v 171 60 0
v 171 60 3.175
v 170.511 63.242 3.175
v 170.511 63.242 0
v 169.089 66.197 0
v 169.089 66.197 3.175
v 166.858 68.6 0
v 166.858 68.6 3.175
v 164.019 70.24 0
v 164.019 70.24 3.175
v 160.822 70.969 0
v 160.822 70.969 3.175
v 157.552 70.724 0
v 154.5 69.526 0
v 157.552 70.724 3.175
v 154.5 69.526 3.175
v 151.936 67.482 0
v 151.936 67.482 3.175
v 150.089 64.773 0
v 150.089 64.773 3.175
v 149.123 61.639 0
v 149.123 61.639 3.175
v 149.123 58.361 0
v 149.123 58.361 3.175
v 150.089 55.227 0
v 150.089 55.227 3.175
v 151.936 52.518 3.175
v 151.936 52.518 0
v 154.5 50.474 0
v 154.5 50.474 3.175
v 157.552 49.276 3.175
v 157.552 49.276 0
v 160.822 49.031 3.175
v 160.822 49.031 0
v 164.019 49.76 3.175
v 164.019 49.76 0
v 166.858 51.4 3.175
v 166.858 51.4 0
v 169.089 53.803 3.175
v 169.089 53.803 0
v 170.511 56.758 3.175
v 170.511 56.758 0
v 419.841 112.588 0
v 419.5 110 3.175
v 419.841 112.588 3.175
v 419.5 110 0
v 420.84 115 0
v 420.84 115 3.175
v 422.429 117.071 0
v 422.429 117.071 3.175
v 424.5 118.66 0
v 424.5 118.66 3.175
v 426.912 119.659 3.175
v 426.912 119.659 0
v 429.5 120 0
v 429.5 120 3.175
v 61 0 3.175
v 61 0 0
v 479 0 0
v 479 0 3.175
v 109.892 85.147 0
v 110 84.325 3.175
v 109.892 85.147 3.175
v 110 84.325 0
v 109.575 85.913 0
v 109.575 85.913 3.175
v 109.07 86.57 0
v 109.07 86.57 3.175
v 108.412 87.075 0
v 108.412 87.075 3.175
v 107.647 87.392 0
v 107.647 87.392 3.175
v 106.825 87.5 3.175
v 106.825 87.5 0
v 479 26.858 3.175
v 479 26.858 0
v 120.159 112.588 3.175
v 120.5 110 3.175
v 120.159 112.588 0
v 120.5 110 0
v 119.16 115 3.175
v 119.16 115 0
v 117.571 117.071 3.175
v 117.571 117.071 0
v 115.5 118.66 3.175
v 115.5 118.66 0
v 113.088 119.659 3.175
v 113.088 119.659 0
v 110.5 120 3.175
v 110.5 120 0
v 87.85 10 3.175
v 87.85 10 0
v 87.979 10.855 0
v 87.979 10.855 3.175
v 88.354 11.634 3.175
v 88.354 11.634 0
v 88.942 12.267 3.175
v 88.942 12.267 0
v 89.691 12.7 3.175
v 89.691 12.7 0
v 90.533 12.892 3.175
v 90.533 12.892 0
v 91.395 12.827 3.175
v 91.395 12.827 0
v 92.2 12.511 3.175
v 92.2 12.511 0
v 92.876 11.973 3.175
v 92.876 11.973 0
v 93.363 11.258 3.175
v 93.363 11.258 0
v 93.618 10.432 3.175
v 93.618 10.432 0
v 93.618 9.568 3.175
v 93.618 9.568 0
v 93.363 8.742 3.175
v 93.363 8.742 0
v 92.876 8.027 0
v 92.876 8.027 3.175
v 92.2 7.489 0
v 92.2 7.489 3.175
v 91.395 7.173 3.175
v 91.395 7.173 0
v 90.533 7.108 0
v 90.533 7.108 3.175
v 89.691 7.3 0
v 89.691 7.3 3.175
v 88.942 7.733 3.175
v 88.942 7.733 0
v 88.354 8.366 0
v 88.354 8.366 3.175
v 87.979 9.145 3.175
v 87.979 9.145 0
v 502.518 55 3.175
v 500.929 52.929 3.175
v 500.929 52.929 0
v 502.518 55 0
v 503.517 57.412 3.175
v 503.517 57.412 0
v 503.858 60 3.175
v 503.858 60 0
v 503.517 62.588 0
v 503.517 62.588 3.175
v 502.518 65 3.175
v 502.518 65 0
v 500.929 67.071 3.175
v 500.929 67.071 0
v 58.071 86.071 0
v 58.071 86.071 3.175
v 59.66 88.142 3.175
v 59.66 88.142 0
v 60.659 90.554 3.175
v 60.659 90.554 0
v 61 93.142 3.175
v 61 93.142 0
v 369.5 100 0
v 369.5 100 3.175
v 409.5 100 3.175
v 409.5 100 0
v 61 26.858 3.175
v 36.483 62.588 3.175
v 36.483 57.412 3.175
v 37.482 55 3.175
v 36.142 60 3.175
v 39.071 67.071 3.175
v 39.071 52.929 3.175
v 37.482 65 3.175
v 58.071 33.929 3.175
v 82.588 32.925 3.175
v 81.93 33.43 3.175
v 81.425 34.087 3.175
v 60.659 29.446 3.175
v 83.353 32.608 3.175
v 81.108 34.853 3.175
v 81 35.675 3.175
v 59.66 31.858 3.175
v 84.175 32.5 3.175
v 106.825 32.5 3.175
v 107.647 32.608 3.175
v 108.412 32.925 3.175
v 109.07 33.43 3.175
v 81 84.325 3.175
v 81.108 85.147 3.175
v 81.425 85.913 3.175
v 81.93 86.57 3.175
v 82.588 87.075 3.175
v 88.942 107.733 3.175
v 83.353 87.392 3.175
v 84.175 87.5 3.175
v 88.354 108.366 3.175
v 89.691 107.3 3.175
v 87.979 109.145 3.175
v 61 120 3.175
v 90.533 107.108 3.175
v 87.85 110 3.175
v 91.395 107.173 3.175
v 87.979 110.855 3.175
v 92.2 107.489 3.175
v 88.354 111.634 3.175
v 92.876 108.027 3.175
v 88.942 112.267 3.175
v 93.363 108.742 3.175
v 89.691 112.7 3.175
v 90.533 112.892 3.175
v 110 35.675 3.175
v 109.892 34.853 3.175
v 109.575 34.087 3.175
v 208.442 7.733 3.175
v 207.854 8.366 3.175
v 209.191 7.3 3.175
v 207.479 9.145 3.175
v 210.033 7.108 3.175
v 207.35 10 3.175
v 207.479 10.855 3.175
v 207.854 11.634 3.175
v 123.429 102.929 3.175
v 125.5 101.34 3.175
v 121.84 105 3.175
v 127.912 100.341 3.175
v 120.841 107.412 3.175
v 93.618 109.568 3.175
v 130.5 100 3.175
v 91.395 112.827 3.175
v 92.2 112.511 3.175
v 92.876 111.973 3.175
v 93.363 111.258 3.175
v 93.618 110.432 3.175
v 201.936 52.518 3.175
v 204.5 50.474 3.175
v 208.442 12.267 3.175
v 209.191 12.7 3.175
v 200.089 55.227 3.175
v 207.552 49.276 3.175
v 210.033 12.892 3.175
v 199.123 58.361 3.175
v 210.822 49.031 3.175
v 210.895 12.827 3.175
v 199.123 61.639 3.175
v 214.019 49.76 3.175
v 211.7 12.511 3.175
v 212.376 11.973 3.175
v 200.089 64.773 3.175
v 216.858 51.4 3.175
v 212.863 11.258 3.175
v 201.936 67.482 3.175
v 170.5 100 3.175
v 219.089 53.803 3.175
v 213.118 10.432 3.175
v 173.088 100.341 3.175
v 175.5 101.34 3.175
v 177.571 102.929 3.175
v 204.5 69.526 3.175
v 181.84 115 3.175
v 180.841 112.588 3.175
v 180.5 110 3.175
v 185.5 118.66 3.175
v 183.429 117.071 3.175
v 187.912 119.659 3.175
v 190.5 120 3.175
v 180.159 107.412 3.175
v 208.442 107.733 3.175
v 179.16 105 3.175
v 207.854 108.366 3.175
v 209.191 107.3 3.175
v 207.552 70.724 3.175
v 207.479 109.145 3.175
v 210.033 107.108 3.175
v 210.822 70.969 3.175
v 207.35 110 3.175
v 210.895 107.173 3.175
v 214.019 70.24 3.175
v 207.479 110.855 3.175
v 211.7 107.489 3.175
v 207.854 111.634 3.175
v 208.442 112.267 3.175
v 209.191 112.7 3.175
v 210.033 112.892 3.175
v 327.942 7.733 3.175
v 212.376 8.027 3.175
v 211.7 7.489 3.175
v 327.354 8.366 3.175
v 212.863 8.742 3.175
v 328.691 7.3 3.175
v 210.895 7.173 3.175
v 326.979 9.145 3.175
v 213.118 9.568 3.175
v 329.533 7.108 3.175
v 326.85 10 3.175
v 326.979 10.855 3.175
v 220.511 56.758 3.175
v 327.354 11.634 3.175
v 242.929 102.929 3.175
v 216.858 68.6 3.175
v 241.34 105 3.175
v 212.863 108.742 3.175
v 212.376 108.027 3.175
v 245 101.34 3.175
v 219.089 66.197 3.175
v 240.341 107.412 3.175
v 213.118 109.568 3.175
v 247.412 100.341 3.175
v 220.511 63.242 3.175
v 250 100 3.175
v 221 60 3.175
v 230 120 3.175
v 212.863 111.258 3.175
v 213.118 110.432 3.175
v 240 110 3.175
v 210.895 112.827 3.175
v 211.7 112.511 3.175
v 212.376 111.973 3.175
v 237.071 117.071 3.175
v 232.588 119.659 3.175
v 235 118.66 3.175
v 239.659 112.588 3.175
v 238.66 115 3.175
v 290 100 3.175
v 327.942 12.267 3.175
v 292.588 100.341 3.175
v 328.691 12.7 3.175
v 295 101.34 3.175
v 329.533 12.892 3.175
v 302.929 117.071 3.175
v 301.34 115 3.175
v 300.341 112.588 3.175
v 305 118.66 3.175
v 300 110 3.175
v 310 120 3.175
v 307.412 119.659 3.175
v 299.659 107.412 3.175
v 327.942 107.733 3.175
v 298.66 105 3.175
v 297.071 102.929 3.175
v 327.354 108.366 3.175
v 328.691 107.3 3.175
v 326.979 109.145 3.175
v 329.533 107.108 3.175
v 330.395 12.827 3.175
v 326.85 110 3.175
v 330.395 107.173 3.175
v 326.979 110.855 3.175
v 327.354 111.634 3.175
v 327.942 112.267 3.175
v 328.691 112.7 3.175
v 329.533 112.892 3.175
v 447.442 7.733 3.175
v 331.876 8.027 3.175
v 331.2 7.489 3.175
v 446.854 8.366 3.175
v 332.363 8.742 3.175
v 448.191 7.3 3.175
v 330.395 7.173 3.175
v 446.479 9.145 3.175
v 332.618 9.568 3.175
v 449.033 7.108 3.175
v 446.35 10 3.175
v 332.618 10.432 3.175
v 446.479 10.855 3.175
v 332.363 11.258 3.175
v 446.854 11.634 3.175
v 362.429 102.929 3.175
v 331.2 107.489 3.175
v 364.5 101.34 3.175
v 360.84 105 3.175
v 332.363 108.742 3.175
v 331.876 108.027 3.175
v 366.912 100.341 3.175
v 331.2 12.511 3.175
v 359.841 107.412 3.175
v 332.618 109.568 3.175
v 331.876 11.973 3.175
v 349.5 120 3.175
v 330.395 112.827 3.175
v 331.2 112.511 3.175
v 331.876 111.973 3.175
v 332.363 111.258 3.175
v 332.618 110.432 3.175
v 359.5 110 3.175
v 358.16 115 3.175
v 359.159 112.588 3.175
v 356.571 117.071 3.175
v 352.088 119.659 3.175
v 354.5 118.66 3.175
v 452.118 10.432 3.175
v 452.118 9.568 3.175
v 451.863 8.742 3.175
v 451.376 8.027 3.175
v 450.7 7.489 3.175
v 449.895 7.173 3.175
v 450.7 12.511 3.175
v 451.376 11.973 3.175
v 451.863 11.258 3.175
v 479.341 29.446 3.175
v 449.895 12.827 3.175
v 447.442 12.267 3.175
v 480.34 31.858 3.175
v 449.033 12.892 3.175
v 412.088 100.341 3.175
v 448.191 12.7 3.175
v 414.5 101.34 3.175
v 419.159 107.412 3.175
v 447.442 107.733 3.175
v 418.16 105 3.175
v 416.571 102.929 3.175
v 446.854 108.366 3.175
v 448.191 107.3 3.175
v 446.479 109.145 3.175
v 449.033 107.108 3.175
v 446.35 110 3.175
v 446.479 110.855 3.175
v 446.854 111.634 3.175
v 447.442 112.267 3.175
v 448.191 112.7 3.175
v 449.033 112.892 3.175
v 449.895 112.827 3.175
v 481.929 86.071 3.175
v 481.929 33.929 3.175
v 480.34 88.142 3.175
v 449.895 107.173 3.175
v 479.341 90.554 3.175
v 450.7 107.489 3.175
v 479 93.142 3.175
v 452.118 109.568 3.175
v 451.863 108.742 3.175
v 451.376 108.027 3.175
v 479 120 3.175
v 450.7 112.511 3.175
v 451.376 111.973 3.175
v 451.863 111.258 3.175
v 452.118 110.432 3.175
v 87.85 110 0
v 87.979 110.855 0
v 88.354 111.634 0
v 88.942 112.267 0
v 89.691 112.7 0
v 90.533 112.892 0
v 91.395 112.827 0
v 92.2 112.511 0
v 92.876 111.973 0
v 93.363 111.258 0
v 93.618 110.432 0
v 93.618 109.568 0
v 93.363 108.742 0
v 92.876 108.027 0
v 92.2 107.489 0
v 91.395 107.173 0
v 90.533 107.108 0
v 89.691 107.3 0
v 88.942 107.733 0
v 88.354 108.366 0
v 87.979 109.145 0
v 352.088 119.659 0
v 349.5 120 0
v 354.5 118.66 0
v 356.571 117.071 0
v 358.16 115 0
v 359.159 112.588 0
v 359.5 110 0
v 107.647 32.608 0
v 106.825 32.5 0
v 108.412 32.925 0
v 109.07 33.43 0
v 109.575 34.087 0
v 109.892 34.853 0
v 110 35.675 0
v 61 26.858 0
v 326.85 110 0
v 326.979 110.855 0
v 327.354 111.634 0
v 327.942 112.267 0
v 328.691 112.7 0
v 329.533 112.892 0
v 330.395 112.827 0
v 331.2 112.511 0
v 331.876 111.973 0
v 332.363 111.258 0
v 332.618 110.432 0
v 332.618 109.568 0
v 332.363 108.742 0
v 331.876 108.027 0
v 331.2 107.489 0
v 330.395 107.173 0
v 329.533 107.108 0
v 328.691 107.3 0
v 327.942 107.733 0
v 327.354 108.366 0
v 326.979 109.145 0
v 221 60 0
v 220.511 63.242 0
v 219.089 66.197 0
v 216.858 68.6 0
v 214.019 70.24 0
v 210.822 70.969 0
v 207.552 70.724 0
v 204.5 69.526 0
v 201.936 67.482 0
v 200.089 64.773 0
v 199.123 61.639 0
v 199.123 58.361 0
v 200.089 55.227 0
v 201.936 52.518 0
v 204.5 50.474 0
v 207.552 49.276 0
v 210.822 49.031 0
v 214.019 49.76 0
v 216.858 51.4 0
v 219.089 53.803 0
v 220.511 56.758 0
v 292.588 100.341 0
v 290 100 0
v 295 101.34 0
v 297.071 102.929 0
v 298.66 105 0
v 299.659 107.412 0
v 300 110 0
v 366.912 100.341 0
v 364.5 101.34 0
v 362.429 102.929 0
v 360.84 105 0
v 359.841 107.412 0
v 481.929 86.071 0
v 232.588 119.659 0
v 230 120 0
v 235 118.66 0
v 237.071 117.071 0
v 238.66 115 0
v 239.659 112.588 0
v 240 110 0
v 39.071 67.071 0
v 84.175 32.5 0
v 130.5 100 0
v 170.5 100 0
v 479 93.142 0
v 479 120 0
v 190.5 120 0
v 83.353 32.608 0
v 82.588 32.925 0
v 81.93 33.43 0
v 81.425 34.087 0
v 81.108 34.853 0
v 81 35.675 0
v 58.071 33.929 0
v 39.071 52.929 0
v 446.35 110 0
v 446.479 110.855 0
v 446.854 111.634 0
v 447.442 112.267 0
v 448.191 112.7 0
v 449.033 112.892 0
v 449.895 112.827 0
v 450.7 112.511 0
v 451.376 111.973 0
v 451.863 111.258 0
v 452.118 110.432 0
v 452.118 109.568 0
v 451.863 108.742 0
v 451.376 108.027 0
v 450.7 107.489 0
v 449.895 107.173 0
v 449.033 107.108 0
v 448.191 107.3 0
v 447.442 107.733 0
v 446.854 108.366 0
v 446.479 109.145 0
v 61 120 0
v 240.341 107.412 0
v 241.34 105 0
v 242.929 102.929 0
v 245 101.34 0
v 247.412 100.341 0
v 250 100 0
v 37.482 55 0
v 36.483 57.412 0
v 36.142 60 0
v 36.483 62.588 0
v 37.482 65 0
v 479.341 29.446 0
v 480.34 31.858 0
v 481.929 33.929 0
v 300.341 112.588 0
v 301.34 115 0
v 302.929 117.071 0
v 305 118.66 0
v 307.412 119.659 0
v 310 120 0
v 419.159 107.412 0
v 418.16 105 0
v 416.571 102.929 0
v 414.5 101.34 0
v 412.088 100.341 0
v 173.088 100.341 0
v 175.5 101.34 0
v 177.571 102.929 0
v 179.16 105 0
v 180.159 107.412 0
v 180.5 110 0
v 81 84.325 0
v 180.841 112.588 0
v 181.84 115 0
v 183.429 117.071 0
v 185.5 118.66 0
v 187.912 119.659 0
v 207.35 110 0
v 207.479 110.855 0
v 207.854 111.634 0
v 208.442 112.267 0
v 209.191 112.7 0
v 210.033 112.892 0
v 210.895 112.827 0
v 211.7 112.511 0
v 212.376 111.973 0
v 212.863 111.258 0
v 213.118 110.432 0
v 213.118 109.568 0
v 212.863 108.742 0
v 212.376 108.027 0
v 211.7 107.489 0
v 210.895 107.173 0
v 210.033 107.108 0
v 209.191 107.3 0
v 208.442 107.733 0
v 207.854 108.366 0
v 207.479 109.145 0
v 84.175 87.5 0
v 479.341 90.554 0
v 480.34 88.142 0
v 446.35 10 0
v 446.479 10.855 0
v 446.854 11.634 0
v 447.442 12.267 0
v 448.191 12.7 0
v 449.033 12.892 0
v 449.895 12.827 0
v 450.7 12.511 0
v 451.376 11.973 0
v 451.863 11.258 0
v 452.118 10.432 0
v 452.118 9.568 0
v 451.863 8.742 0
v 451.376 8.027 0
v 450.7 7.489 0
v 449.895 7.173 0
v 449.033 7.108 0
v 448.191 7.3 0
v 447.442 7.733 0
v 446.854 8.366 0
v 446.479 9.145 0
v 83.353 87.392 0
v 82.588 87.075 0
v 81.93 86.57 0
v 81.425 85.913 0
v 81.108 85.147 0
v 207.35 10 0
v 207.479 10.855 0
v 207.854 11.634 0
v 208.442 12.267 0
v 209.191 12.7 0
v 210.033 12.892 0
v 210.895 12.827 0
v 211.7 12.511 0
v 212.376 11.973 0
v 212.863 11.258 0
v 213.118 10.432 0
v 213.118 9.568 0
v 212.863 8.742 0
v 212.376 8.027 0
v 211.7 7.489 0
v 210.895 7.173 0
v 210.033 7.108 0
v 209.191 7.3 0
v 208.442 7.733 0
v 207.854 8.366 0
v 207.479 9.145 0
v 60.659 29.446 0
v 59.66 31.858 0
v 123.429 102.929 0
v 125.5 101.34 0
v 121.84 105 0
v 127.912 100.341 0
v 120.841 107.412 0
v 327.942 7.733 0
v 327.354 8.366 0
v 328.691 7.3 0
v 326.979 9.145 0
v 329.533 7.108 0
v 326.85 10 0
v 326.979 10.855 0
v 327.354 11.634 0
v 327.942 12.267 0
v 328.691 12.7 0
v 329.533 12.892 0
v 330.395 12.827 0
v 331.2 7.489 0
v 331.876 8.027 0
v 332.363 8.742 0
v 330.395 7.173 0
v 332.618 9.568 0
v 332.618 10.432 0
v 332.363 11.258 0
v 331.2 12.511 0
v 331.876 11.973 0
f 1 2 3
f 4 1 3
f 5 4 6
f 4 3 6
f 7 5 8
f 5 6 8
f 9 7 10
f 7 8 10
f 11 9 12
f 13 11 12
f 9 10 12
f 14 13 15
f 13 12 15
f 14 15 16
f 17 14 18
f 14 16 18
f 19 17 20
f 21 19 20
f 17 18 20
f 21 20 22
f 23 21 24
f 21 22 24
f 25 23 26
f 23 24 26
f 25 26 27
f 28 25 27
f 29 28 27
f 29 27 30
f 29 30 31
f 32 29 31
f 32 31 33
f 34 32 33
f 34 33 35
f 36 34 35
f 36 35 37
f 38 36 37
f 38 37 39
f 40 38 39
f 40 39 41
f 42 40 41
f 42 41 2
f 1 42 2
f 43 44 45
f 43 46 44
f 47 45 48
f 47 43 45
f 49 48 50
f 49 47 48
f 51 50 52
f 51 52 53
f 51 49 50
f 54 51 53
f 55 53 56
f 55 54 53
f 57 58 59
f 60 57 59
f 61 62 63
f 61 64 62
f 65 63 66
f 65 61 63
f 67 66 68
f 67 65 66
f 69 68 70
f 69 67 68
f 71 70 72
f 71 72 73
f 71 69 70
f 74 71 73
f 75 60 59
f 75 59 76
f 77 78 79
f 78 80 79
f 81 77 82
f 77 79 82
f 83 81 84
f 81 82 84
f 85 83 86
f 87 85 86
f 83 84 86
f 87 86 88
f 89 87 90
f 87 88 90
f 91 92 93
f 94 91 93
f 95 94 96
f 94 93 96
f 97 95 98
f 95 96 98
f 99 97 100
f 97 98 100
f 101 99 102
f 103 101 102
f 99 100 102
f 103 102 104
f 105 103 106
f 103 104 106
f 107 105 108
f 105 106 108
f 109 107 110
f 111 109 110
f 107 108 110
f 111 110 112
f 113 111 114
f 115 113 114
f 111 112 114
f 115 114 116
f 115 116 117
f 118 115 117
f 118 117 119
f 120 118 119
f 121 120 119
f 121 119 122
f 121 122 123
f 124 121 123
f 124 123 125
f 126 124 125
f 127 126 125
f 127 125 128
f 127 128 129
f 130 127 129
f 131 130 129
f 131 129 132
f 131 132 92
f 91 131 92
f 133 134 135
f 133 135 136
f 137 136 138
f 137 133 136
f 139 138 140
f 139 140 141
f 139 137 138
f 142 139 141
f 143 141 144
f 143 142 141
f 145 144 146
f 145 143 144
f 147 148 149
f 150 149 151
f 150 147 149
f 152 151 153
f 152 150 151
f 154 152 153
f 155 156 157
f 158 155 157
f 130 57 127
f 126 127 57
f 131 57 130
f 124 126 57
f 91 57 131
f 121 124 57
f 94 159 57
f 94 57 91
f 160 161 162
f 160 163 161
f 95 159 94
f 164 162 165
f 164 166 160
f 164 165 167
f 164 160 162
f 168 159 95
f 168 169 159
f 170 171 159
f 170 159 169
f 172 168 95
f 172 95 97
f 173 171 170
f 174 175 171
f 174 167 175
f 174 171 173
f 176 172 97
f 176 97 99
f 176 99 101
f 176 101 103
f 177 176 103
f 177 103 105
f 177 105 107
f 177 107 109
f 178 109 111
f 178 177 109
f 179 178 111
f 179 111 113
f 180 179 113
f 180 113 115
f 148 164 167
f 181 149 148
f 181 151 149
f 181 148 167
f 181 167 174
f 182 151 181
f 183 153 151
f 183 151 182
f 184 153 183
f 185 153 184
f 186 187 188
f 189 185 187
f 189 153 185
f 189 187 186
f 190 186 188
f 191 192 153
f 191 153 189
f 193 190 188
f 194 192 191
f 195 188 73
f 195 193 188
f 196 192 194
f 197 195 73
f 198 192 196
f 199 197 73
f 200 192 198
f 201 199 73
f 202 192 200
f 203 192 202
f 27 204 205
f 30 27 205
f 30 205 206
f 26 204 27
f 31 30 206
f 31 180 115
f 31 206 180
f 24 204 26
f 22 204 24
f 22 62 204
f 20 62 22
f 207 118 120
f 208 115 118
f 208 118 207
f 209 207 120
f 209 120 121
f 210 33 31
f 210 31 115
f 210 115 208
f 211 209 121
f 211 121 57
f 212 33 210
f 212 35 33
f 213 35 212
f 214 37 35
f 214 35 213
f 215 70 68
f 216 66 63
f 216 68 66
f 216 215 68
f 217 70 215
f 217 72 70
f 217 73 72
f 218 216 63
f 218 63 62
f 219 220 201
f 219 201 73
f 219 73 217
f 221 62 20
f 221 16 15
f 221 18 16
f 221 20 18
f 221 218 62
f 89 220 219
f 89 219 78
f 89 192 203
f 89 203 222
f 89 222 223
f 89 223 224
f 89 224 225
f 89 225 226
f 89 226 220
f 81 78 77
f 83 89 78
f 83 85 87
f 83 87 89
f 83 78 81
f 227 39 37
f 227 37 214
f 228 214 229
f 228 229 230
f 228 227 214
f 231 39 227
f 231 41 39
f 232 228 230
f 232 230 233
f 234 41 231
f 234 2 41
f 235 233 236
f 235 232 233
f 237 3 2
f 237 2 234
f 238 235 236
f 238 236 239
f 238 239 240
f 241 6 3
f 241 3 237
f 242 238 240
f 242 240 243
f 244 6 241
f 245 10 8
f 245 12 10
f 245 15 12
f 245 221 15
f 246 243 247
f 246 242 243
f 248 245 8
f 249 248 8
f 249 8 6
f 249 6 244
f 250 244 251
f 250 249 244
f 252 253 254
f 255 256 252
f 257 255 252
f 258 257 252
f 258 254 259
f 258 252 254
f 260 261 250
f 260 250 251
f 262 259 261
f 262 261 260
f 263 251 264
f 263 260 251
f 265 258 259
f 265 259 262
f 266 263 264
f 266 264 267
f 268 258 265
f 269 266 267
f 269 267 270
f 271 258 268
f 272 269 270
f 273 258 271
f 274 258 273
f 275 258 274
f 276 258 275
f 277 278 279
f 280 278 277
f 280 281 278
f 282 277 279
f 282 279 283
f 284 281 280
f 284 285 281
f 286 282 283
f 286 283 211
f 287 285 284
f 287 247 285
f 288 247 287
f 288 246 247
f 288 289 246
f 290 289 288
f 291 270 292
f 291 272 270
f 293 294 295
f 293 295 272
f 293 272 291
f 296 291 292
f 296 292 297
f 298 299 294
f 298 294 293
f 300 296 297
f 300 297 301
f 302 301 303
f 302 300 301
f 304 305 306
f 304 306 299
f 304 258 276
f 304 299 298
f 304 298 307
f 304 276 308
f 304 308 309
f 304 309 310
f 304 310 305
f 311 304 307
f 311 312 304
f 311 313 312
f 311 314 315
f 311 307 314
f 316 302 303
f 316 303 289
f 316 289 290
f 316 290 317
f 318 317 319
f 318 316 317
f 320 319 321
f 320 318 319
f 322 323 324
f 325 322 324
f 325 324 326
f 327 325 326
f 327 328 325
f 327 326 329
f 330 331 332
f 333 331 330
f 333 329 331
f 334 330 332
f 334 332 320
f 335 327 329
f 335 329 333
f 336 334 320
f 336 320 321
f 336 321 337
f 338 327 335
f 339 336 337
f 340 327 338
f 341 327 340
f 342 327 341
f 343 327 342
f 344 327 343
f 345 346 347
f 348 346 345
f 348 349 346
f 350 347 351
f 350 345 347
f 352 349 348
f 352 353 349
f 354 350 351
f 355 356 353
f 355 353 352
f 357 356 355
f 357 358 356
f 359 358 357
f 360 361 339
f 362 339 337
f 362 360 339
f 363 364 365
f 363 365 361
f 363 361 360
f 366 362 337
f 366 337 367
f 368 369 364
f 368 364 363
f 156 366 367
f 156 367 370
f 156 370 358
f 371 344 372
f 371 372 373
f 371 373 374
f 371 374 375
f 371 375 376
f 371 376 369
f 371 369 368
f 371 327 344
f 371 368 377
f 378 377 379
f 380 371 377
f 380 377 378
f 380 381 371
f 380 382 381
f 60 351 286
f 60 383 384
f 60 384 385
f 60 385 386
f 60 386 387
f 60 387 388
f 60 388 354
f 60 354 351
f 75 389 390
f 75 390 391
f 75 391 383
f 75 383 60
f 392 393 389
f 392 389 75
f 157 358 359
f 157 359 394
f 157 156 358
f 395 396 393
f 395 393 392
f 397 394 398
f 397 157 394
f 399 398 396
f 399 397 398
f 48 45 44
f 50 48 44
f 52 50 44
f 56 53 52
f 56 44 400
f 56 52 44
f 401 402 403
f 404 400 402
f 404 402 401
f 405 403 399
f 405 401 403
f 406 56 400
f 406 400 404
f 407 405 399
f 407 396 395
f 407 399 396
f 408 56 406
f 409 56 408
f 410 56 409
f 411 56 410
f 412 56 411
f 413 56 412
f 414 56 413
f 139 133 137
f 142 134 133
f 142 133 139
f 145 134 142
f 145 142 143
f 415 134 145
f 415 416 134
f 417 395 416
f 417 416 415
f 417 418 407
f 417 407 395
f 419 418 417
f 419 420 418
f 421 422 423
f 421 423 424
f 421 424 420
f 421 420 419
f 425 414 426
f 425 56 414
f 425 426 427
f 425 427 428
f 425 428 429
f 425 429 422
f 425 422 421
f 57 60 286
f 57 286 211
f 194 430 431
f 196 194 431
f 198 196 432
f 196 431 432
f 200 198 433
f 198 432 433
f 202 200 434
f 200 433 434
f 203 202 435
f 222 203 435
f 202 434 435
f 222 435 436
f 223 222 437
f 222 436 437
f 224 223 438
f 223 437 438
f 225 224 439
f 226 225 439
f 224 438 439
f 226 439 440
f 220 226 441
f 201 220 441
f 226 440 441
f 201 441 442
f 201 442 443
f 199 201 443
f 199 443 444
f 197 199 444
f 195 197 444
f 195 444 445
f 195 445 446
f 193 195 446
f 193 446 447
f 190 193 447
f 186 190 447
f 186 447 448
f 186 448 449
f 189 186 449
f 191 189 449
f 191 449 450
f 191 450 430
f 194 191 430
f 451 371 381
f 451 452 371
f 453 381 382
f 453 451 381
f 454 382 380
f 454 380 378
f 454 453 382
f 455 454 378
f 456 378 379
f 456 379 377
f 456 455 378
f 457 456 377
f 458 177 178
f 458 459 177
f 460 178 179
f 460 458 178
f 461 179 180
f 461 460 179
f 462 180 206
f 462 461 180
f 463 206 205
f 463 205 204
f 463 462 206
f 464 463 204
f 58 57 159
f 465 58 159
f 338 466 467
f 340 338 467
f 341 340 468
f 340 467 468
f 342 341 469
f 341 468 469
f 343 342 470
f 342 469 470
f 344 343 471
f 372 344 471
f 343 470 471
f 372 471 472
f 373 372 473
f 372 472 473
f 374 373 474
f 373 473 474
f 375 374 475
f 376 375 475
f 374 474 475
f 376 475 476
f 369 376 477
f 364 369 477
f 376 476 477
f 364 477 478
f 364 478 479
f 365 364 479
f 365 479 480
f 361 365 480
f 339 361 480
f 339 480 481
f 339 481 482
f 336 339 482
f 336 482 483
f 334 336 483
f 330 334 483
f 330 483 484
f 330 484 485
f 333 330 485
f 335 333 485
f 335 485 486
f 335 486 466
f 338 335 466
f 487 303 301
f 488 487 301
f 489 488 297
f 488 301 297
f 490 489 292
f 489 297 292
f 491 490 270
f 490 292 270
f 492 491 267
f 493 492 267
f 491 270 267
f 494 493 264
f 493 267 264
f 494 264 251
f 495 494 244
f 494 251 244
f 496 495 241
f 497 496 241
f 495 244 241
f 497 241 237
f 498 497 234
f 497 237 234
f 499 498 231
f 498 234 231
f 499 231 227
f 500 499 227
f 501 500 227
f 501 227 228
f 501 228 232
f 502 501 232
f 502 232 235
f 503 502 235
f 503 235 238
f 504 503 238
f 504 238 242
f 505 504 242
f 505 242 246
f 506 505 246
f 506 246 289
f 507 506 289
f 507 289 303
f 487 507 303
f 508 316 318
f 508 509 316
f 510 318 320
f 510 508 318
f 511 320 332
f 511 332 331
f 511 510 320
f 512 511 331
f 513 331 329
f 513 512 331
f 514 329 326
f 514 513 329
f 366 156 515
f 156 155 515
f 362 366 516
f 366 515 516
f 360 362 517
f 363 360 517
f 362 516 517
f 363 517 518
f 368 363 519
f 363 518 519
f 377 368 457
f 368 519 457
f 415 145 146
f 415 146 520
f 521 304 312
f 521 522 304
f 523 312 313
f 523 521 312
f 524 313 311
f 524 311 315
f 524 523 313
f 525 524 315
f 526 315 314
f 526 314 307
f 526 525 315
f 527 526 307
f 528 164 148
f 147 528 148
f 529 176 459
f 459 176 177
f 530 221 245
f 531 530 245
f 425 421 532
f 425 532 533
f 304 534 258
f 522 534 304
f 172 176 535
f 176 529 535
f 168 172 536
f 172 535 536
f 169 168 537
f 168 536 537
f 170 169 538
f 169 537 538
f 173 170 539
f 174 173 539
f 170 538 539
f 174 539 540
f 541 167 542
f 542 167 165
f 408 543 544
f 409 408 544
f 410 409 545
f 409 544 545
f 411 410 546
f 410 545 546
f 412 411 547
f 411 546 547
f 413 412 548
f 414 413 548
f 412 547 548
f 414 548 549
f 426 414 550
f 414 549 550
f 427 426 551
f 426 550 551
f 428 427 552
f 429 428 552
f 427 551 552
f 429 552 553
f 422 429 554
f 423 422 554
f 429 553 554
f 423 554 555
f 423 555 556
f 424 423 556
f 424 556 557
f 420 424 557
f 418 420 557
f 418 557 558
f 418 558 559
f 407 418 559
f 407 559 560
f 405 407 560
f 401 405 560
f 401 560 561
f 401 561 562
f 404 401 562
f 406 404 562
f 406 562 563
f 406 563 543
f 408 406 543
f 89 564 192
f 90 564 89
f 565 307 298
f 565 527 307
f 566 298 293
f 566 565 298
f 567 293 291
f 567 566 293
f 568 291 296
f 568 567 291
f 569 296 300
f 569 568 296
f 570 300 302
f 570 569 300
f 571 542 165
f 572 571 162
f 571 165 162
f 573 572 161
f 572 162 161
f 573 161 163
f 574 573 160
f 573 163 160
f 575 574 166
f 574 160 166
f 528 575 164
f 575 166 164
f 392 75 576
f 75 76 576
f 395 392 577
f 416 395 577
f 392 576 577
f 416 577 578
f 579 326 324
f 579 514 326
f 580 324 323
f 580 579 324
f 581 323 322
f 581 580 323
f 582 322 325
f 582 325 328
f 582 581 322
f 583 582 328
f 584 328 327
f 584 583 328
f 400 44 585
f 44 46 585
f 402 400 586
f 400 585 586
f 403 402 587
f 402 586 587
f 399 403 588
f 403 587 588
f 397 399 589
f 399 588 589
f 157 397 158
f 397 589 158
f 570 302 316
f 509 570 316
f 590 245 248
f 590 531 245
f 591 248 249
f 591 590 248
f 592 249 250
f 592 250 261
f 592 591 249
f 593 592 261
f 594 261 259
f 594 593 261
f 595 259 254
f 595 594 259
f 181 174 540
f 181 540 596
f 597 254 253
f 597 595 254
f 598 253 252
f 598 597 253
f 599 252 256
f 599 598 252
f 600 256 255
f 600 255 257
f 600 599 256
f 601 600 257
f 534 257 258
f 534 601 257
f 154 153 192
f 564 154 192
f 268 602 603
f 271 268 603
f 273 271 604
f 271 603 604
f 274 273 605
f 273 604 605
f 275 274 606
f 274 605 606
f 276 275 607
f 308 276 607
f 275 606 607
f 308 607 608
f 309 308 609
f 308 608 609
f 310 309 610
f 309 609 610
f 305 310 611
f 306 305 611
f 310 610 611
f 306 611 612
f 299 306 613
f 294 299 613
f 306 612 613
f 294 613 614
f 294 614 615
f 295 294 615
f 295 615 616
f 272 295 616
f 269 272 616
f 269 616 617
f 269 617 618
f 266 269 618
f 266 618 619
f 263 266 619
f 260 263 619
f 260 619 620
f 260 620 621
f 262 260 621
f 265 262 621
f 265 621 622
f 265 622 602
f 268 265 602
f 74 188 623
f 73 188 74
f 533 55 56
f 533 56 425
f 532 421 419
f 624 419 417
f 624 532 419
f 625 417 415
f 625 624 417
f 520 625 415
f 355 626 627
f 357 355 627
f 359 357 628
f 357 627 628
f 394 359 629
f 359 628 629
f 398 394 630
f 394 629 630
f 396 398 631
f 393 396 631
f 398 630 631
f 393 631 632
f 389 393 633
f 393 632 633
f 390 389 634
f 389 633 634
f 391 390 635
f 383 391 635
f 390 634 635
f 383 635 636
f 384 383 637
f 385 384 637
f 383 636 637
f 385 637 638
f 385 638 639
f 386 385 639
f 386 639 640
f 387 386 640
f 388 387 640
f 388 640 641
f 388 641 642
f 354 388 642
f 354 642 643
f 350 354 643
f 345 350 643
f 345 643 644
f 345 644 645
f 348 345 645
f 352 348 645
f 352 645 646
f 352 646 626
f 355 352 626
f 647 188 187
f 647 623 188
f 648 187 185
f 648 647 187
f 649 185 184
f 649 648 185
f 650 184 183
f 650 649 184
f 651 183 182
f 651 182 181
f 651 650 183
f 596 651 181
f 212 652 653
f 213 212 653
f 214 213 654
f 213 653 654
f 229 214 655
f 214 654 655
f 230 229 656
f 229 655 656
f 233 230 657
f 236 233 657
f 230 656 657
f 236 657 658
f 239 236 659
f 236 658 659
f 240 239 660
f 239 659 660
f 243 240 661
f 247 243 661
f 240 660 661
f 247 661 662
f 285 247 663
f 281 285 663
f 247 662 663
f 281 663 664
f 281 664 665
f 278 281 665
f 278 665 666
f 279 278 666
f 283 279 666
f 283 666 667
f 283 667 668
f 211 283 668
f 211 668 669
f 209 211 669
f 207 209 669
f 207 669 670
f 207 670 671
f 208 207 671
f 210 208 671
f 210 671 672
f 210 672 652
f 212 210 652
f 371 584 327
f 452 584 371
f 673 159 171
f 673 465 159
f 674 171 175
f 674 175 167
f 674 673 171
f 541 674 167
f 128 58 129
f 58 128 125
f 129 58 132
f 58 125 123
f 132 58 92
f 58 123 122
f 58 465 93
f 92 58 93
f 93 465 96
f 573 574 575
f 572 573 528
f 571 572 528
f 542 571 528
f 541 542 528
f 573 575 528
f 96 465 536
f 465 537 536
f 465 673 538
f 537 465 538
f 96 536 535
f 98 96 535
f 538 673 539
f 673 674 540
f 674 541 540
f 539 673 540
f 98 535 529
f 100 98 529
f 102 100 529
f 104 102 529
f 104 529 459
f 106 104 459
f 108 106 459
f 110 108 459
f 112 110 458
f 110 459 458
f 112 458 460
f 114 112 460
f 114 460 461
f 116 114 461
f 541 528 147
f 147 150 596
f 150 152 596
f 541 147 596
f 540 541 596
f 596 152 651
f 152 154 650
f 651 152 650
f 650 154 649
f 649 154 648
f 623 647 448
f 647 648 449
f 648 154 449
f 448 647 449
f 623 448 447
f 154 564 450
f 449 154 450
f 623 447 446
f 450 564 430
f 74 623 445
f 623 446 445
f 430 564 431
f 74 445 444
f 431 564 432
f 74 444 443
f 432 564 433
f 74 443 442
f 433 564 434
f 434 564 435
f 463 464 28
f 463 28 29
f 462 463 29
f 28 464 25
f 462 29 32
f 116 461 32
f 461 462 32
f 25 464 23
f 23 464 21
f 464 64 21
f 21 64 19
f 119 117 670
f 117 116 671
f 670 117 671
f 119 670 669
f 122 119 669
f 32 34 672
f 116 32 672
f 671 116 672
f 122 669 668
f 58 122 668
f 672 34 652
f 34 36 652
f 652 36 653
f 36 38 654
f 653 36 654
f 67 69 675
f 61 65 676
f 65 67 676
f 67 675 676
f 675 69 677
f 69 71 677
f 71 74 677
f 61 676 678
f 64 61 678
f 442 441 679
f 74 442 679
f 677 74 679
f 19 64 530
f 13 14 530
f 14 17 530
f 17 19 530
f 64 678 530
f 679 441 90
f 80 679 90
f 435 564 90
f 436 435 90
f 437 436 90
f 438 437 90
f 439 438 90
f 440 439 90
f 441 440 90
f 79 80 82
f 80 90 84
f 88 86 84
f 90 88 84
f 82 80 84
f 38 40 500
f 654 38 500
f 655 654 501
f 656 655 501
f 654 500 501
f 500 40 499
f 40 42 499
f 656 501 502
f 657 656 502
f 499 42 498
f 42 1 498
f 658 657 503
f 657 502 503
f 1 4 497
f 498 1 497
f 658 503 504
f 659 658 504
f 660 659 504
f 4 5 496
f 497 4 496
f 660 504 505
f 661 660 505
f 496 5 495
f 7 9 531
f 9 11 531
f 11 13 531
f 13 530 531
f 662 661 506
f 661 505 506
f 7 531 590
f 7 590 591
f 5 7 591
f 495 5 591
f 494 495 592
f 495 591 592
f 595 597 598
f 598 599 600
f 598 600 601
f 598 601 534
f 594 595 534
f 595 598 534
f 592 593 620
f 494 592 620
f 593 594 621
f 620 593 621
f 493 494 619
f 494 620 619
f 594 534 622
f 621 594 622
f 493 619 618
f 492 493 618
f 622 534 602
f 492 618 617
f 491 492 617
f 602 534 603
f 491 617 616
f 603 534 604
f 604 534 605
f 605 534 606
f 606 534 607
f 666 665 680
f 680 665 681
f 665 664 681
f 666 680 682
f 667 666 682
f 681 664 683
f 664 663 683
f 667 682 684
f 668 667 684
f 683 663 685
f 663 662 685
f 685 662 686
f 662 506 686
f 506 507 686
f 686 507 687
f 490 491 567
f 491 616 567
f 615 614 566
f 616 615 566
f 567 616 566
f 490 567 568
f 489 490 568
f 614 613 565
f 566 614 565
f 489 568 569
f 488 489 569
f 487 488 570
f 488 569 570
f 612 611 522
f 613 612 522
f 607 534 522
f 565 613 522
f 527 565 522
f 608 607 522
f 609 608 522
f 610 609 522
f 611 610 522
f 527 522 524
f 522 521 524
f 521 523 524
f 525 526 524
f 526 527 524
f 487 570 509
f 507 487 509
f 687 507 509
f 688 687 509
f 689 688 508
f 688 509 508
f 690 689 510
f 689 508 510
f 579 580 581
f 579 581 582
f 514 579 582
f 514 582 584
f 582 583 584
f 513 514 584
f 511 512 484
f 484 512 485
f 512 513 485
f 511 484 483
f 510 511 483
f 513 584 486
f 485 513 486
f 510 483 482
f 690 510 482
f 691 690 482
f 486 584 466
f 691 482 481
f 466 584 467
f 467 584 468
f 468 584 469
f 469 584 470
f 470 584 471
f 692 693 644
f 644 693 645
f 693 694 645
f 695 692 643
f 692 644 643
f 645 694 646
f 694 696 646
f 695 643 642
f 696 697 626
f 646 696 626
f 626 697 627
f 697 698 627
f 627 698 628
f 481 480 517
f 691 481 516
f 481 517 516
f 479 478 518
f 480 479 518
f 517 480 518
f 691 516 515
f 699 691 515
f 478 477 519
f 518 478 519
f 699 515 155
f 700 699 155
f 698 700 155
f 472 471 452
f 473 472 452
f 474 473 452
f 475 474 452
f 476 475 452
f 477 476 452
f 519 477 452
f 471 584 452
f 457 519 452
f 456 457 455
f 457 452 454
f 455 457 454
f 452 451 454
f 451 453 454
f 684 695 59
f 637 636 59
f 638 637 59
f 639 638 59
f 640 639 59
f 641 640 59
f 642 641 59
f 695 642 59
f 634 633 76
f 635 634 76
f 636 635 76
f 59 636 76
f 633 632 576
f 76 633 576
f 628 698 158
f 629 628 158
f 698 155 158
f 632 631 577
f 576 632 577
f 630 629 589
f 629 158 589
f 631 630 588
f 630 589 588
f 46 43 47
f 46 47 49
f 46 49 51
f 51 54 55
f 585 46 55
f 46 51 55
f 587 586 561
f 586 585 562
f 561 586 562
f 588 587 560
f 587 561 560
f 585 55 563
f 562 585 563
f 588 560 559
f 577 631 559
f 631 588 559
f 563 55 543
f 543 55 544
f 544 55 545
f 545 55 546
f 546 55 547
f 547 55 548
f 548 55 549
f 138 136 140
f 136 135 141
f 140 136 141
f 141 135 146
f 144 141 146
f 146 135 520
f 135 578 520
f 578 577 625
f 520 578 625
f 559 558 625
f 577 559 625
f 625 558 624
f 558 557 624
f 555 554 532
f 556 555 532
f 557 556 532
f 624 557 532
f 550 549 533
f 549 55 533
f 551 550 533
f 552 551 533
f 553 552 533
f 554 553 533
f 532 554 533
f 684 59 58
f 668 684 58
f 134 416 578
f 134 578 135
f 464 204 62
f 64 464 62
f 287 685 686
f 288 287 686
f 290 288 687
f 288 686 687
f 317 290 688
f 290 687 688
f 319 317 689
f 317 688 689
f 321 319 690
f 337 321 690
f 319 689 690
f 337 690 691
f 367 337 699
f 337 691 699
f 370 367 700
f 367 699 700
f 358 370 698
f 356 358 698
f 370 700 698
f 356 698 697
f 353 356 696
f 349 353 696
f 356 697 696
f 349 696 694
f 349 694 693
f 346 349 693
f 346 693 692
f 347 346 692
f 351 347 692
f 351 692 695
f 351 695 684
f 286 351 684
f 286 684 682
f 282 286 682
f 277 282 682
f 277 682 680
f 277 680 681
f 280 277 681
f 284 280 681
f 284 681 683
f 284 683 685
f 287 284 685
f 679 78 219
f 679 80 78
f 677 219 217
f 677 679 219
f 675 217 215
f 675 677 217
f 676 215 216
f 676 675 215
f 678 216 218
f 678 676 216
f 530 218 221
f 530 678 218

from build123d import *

# Parameters (mm, degrees)
SKETCH2_W            = 540
SKETCH2_H            = 120
BOSS_EXTRUDE1_DEPTH  = 3.175
SKETCH3_W            = 60
SKETCH3_H            = 20
CUT_EXTRUDE1_DEPTH   = 554.181779007
FILLET1_R            = 10
FILLET2_R            = 10
M5_CLEARANCE_HOLE1_D = 5.8
LPATTERN1_COUNT      = 4
LPATTERN1_PITCH      = 119.5
SKETCH6_R            = 11
SKETCH6_W            = 29
SKETCH6_H            = 55
CUT_EXTRUDE2_DEPTH   = 518.960257277
FILLET3_R            = 3.175


with BuildPart() as part:
    # Sketch2 → Boss-Extrude1 (new body)
    with BuildSketch(Plane.XY):
        with Locations((270, 60)):
            Rectangle(SKETCH2_W, SKETCH2_H)
    extrude(amount=BOSS_EXTRUDE1_DEPTH)

    # Sketch3 → Cut-Extrude1 (cut, through all)
    with BuildSketch(Plane.XY.offset(3.175)):
        with BuildLine():
            Line((0, 0), (61, 0))
            Line((61, 0), (61, 31))
            Line((61, 31), (39.071067812, 52.928932188))
            ThreePointArc((39.071067812, 52.928932188), (36.142135624, 60), (39.071067812, 67.071067812))
            Line((39.071067812, 67.071067812), (61, 89))
            Line((61, 89), (61, 120))
            Line((61, 120), (0, 120))
            Line((0, 120), (0, 0))
        make_face()
        with BuildLine():
            Line((479, 89), (479, 120))
            Line((479, 120), (540, 120))
            Line((540, 120), (540, 0))
            Line((540, 0), (479, 0))
            Line((479, 0), (479, 31))
            Line((479, 31), (500.928932188, 52.928932188))
            ThreePointArc((500.928932188, 52.928932188), (503.857864376, 60), (500.928932188, 67.071067812))
            Line((500.928932188, 67.071067812), (479, 89))
        make_face()
        with Locations((270, 110)):
            Rectangle(SKETCH3_W, SKETCH3_H)
        with Locations((150.5, 110)):
            Rectangle(SKETCH3_W, SKETCH3_H)
        with Locations((389.5, 110)):
            Rectangle(SKETCH3_W, SKETCH3_H)
    extrude(amount=-CUT_EXTRUDE1_DEPTH, mode=Mode.SUBTRACT)

    # Fillet1
    fillet1_edges = [part.edges().sort_by_distance(p)[0] for p in [
        (61, 89, 1.5875),
        (61, 31, 1.5875),
        (479, 31, 1.5875),
        (479, 89, 1.5875),
    ]]
    fillet(fillet1_edges, radius=FILLET1_R)

    # Fillet2
    fillet2_edges = [part.edges().sort_by_distance(p)[0] for p in [
        (419.5, 100, 1.5875),
        (359.5, 100, 1.5875),
        (300, 100, 1.5875),
        (240, 100, 1.5875),
        (180.5, 100, 1.5875),
        (120.5, 100, 1.5875),
    ]]
    fillet(fillet2_edges, radius=FILLET2_R)
    fillet2_2_edges = [part.edges().sort_by_distance(p)[0] for p in [
        (419.5, 120, 1.5875),
        (359.5, 120, 1.5875),
        (300, 120, 1.5875),
        (240, 120, 1.5875),
        (180.5, 120, 1.5875),
        (120.5, 120, 1.5875),
    ]]
    fillet(fillet2_2_edges, radius=FILLET2_R - 0.0001)  # a hair under: the kernel refuses the full size

    # M5 Clearance Hole1 (through all)
    with Locations(Plane(origin=(90.75, 10, 3.175), x_dir=(1, 0, 0), z_dir=(0, 0, 1))):
        with Locations((0, 0), (0, 100)):
            m5_clearance_hole1 = Hole(M5_CLEARANCE_HOLE1_D / 2)

    # LPattern1: M5 Clearance Hole1 ×4
    with Locations(*[(i * LPATTERN1_PITCH, 0, 0) for i in range(1, LPATTERN1_COUNT)]):
        add(m5_clearance_hole1, mode=Mode.SUBTRACT)

    # Sketch6 → Cut-Extrude2 (cut, through all)
    with BuildSketch(Plane.XY.offset(3.175)):
        with Locations((160, 60)):
            Circle(SKETCH6_R)
        with Locations((210, 60)):
            Circle(SKETCH6_R)
        with Locations((95.5, 60)):
            Rectangle(SKETCH6_W, SKETCH6_H)
    extrude(amount=-CUT_EXTRUDE2_DEPTH, mode=Mode.SUBTRACT)

    # Fillet3
    fillet3_edges = [part.edges().sort_by_distance(p)[0] for p in [
        (81, 32.5, 1.5875),
        (81, 87.5, 1.5875),
        (110, 87.5, 1.5875),
        (110, 32.5, 1.5875),
    ]]
    fillet(fillet3_edges, radius=FILLET3_R)


solid = part.part
